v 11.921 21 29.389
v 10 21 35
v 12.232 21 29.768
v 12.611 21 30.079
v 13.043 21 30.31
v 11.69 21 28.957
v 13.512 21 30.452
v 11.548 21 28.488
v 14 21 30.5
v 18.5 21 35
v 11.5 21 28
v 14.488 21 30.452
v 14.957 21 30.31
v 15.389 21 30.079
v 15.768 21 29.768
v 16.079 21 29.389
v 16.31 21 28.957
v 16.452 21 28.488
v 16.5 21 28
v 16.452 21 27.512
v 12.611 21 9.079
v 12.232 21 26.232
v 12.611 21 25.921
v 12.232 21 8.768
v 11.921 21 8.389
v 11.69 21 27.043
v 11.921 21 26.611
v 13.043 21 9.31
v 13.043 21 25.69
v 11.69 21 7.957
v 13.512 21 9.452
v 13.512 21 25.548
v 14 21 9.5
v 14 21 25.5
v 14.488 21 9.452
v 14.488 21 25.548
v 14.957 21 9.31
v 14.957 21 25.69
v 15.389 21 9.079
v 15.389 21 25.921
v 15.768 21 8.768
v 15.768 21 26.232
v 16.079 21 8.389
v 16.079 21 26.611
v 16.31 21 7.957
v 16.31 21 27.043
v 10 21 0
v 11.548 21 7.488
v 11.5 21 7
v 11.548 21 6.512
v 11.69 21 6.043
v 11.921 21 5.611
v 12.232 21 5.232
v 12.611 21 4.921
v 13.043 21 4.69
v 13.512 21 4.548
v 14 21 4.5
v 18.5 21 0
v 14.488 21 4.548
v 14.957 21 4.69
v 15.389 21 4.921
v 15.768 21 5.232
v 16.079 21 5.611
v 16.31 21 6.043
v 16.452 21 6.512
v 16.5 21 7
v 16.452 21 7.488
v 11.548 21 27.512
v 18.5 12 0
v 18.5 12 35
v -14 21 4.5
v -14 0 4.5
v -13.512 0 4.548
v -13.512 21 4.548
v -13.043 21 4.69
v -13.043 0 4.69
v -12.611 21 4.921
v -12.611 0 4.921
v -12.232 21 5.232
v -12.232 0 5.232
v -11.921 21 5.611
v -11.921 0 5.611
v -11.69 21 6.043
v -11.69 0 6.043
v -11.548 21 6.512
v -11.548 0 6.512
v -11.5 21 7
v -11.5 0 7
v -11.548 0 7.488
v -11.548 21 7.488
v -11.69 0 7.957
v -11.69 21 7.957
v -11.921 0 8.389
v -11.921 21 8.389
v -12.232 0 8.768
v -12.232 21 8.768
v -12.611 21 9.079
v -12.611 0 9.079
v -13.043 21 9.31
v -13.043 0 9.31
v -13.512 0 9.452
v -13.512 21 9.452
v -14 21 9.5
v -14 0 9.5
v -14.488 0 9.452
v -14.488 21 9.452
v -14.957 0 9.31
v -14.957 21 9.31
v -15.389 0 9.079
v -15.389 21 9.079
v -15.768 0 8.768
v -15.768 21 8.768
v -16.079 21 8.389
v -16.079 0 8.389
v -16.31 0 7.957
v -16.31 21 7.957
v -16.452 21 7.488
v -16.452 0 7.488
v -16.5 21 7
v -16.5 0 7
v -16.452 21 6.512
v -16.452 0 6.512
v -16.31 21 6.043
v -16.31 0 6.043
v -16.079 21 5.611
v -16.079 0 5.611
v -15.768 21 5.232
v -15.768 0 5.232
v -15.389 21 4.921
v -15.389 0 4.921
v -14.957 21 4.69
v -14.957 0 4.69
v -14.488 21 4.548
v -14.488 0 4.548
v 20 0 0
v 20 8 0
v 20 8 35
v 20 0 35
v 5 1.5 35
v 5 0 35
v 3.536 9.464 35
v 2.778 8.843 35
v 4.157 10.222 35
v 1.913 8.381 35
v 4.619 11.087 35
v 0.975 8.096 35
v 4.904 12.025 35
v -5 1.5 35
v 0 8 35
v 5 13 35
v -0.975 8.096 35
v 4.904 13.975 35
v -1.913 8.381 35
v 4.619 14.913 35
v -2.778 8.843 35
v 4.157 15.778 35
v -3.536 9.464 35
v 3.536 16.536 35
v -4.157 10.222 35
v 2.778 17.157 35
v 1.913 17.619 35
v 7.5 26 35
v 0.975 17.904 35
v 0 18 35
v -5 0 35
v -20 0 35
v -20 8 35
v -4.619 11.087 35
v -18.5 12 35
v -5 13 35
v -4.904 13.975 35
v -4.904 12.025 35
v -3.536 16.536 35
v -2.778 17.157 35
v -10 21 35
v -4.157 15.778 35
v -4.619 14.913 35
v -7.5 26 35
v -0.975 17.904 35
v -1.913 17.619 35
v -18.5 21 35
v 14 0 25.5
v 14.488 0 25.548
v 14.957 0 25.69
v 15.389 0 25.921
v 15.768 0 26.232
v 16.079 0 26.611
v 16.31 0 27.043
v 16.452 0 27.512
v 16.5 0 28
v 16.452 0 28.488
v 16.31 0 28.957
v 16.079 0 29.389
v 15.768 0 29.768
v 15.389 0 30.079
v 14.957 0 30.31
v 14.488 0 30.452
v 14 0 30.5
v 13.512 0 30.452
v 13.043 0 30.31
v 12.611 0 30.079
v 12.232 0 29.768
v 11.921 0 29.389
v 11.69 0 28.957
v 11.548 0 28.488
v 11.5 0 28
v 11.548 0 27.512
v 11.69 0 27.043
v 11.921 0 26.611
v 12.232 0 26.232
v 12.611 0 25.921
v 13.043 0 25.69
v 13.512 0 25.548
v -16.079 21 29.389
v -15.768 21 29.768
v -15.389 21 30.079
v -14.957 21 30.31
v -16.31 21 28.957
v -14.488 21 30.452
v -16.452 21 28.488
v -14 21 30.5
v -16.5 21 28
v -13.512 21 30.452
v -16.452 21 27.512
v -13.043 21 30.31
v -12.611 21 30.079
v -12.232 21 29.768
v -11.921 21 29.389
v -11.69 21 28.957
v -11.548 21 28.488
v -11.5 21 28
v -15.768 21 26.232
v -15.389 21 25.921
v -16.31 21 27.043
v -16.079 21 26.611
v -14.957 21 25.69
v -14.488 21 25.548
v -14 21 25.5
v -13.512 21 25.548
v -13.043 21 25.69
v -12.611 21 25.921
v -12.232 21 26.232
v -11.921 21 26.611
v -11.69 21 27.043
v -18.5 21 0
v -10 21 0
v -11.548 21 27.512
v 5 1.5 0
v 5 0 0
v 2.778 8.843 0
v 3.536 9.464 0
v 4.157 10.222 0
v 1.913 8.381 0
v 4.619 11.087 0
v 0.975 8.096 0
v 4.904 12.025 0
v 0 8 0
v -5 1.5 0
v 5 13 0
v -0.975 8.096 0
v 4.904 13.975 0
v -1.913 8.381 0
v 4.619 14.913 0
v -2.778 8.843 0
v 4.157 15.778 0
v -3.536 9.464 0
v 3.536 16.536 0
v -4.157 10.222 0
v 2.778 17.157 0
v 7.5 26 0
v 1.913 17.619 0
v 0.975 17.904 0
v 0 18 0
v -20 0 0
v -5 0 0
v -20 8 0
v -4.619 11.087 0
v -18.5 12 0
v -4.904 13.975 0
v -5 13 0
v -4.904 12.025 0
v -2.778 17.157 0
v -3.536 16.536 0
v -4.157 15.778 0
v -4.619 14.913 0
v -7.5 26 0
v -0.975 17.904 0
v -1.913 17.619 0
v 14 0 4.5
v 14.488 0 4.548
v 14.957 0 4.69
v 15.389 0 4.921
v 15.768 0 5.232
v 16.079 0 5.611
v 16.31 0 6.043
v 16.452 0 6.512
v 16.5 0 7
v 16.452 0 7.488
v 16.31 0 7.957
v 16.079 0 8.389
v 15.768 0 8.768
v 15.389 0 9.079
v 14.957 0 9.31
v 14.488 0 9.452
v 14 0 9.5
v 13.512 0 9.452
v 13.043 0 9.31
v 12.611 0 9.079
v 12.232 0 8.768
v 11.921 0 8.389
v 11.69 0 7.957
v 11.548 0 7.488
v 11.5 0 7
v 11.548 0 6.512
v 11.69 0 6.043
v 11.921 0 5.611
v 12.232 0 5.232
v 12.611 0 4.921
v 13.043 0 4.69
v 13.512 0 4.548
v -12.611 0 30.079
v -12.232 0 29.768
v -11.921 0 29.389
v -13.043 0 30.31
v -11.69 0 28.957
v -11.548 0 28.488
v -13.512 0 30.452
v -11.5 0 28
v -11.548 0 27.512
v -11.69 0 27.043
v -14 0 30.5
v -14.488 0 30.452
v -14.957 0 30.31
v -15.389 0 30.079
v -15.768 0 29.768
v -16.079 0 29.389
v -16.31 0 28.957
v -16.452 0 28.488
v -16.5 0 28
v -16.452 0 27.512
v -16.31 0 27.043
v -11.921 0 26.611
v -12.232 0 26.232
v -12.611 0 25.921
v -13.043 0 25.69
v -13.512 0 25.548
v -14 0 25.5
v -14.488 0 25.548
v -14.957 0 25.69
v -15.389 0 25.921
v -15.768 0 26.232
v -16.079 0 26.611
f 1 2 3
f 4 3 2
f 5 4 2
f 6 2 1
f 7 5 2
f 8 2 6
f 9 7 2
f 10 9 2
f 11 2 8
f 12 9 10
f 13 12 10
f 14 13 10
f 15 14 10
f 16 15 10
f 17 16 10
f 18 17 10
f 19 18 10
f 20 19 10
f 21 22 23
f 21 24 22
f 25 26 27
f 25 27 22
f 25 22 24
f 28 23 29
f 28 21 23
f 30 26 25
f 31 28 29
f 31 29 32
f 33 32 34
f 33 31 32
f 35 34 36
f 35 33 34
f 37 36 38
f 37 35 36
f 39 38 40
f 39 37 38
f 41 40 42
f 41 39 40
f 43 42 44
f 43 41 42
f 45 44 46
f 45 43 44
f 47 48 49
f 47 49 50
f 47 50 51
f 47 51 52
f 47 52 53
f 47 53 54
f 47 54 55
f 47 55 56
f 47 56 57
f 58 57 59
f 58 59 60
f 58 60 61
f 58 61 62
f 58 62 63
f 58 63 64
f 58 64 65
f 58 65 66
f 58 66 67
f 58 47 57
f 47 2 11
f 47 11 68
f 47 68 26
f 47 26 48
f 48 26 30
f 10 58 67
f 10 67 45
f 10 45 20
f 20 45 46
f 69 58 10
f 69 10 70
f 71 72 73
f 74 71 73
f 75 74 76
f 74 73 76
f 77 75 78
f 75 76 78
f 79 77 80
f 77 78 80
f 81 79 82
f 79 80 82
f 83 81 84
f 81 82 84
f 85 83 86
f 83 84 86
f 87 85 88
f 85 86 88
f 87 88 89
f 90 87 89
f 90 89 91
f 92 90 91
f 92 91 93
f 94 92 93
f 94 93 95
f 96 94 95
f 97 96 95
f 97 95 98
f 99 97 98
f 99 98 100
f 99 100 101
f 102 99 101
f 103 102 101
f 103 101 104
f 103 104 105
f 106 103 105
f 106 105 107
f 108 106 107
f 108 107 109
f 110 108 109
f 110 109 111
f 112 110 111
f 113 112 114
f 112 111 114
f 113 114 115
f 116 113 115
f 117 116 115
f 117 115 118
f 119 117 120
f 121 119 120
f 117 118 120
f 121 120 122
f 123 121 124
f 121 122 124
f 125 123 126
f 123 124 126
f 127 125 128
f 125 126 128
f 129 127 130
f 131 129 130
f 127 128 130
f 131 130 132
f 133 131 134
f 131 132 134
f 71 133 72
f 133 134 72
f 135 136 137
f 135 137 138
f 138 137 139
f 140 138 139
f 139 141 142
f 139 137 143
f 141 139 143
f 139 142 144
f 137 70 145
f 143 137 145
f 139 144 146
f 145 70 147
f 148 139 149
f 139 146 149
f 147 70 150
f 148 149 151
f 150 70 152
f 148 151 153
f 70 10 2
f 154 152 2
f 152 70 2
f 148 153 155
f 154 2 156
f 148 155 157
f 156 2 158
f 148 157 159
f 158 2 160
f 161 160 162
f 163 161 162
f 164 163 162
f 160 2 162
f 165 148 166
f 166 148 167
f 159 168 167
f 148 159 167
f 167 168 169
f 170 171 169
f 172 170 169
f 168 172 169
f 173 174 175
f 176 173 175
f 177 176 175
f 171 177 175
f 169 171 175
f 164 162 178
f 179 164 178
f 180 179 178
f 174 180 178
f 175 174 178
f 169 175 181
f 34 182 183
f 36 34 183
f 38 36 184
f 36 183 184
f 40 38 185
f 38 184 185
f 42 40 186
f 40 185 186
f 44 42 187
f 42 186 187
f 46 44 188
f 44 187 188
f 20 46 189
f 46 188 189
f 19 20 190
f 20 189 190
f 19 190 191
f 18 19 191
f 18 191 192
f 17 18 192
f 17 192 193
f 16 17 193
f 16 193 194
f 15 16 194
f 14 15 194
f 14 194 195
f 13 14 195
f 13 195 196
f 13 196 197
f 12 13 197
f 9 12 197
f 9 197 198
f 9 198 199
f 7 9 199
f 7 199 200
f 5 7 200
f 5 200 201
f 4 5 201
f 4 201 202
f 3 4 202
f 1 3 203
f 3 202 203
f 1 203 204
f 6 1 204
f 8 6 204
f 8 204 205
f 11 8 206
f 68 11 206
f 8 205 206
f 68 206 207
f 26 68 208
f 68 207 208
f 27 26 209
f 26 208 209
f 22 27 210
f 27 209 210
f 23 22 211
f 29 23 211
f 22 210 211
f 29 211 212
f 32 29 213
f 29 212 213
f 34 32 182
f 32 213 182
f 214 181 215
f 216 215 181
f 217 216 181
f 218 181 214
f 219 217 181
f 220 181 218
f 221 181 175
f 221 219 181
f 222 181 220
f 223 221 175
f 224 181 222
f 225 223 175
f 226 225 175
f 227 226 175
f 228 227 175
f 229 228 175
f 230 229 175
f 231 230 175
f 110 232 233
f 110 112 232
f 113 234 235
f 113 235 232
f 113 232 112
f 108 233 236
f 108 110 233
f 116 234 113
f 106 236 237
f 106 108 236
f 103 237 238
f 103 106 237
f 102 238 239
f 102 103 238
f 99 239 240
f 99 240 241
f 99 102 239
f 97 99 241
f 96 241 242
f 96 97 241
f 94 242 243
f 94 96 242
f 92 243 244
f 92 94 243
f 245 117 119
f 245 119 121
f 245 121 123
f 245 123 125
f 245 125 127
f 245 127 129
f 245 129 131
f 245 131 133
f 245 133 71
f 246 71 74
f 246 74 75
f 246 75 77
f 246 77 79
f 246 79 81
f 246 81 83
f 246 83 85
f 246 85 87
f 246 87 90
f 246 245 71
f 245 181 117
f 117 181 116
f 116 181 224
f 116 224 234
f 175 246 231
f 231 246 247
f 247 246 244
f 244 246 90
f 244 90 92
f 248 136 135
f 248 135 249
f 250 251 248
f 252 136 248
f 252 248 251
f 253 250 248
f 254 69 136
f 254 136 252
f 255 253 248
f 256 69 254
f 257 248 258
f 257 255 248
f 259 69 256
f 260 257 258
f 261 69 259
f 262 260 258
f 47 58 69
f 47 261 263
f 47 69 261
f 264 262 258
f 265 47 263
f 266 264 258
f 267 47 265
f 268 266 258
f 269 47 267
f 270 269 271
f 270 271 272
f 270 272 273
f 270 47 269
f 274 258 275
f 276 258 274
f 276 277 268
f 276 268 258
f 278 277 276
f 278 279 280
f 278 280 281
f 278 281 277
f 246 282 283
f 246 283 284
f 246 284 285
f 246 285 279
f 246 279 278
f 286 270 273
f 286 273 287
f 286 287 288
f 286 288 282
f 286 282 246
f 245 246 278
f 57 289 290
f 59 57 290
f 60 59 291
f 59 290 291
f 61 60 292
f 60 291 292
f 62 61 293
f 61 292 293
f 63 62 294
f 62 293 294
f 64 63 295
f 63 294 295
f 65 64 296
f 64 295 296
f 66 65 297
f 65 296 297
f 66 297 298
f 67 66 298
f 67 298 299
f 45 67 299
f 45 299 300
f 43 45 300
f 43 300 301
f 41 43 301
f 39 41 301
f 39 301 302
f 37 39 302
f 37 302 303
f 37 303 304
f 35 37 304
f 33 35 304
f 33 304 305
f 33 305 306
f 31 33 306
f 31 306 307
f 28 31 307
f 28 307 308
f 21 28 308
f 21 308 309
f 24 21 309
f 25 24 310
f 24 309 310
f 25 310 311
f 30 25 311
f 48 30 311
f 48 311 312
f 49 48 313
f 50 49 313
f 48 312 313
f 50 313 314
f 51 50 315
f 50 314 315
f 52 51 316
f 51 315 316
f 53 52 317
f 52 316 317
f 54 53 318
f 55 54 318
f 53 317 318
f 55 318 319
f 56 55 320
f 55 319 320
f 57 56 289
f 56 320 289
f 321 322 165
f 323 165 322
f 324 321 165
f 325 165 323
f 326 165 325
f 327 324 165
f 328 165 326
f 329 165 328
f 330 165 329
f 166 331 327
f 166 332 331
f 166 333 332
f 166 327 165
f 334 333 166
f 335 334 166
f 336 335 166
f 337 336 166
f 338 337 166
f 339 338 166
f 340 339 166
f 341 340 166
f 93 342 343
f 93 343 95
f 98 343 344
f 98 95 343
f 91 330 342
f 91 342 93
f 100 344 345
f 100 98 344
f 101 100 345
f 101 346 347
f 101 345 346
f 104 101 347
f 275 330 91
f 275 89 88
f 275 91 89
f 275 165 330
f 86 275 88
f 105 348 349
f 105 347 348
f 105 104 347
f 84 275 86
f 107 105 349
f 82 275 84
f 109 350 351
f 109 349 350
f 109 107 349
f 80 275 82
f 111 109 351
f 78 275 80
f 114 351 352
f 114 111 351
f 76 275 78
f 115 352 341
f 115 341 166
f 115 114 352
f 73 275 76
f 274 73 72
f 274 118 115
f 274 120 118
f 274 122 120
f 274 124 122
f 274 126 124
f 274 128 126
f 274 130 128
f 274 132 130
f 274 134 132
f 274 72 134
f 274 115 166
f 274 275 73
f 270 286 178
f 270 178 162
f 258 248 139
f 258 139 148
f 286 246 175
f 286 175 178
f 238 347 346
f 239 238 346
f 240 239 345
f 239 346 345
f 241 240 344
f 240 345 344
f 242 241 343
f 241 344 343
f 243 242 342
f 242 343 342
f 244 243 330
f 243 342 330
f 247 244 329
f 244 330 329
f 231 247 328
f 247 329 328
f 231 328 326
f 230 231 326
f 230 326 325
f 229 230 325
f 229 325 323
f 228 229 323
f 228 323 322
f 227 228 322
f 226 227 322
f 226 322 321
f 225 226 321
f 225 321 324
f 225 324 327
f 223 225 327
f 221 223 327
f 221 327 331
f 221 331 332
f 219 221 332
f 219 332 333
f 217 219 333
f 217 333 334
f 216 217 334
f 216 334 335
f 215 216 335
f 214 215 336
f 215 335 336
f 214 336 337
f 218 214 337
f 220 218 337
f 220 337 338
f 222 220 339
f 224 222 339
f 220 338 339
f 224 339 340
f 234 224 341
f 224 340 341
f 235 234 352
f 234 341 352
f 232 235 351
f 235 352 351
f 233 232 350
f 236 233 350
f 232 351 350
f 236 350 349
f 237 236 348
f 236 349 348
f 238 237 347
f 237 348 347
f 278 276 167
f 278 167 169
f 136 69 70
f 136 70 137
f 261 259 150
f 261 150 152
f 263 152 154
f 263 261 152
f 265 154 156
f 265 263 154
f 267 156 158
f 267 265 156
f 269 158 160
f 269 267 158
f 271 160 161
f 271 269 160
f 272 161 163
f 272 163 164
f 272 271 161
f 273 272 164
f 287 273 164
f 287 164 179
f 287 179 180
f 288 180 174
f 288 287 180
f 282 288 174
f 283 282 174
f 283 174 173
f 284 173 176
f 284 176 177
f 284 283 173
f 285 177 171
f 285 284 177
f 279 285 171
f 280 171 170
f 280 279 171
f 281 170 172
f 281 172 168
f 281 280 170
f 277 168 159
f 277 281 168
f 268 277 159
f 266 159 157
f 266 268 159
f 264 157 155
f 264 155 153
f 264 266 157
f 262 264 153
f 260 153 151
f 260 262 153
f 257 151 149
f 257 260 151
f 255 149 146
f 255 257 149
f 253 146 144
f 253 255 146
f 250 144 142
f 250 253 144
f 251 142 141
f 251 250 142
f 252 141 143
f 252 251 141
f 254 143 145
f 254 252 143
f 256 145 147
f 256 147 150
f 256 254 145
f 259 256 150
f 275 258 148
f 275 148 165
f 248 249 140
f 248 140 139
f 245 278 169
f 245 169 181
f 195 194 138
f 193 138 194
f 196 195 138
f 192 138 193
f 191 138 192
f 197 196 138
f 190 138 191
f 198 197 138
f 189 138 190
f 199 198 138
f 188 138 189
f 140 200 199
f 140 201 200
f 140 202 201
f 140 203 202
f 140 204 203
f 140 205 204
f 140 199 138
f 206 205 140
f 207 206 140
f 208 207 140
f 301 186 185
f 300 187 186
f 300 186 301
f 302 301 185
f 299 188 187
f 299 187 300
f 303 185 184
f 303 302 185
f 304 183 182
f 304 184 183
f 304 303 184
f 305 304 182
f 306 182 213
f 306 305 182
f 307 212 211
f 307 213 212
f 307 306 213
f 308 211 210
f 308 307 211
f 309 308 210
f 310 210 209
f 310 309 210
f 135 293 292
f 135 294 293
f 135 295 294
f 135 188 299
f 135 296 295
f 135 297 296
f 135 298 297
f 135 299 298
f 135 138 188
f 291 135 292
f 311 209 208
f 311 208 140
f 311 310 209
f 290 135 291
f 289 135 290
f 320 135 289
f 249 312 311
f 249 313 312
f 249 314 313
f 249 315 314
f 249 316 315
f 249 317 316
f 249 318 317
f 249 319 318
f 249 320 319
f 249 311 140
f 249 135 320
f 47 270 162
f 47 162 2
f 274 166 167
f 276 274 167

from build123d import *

# Parameters (mm, degrees)
SKETCH_1_R          = 5
EXTRUDE_1_DEPTH     = 35
SKETCH_2_R          = 2.5
CUT_EXTRUDE_1_DEPTH = 48.968739821


with BuildPart() as part:
    # Эскиз1 → Бобышка-Вытянуть1 (new body)
    with BuildSketch(Plane.XY):
        Polygon((-18.5, 21), (-10, 21), (-7.5, 26), (7.5, 26), (10, 21), (18.5, 21), (18.5, 12), (20, 8), (20, 0), (5, 0), (5, 1.5), (-5, 1.5), (-5, 0), (-20, 0), (-20, 8), (-18.5, 12), align=None)
        with Locations((0, 13)):
            Circle(SKETCH_1_R, mode=Mode.SUBTRACT)
    extrude(amount=EXTRUDE_1_DEPTH)

    # Эскиз2 → Вырез-Вытянуть1 (cut, through all)
    with BuildSketch(Plane.XZ):
        with Locations(Location((-14, 28, 0), (0, 0, 270))):
            Circle(SKETCH_2_R)
        with Locations(Location((14, 28, 0), (0, 0, 270))):
            Circle(SKETCH_2_R)
        with Locations(Location((14, 7, 0), (0, 0, 270))):
            Circle(SKETCH_2_R)
        with Locations(Location((-14, 7, 0), (0, 0, 270))):
            Circle(SKETCH_2_R)
    extrude(amount=-CUT_EXTRUDE_1_DEPTH, mode=Mode.SUBTRACT)


solid = part.part
